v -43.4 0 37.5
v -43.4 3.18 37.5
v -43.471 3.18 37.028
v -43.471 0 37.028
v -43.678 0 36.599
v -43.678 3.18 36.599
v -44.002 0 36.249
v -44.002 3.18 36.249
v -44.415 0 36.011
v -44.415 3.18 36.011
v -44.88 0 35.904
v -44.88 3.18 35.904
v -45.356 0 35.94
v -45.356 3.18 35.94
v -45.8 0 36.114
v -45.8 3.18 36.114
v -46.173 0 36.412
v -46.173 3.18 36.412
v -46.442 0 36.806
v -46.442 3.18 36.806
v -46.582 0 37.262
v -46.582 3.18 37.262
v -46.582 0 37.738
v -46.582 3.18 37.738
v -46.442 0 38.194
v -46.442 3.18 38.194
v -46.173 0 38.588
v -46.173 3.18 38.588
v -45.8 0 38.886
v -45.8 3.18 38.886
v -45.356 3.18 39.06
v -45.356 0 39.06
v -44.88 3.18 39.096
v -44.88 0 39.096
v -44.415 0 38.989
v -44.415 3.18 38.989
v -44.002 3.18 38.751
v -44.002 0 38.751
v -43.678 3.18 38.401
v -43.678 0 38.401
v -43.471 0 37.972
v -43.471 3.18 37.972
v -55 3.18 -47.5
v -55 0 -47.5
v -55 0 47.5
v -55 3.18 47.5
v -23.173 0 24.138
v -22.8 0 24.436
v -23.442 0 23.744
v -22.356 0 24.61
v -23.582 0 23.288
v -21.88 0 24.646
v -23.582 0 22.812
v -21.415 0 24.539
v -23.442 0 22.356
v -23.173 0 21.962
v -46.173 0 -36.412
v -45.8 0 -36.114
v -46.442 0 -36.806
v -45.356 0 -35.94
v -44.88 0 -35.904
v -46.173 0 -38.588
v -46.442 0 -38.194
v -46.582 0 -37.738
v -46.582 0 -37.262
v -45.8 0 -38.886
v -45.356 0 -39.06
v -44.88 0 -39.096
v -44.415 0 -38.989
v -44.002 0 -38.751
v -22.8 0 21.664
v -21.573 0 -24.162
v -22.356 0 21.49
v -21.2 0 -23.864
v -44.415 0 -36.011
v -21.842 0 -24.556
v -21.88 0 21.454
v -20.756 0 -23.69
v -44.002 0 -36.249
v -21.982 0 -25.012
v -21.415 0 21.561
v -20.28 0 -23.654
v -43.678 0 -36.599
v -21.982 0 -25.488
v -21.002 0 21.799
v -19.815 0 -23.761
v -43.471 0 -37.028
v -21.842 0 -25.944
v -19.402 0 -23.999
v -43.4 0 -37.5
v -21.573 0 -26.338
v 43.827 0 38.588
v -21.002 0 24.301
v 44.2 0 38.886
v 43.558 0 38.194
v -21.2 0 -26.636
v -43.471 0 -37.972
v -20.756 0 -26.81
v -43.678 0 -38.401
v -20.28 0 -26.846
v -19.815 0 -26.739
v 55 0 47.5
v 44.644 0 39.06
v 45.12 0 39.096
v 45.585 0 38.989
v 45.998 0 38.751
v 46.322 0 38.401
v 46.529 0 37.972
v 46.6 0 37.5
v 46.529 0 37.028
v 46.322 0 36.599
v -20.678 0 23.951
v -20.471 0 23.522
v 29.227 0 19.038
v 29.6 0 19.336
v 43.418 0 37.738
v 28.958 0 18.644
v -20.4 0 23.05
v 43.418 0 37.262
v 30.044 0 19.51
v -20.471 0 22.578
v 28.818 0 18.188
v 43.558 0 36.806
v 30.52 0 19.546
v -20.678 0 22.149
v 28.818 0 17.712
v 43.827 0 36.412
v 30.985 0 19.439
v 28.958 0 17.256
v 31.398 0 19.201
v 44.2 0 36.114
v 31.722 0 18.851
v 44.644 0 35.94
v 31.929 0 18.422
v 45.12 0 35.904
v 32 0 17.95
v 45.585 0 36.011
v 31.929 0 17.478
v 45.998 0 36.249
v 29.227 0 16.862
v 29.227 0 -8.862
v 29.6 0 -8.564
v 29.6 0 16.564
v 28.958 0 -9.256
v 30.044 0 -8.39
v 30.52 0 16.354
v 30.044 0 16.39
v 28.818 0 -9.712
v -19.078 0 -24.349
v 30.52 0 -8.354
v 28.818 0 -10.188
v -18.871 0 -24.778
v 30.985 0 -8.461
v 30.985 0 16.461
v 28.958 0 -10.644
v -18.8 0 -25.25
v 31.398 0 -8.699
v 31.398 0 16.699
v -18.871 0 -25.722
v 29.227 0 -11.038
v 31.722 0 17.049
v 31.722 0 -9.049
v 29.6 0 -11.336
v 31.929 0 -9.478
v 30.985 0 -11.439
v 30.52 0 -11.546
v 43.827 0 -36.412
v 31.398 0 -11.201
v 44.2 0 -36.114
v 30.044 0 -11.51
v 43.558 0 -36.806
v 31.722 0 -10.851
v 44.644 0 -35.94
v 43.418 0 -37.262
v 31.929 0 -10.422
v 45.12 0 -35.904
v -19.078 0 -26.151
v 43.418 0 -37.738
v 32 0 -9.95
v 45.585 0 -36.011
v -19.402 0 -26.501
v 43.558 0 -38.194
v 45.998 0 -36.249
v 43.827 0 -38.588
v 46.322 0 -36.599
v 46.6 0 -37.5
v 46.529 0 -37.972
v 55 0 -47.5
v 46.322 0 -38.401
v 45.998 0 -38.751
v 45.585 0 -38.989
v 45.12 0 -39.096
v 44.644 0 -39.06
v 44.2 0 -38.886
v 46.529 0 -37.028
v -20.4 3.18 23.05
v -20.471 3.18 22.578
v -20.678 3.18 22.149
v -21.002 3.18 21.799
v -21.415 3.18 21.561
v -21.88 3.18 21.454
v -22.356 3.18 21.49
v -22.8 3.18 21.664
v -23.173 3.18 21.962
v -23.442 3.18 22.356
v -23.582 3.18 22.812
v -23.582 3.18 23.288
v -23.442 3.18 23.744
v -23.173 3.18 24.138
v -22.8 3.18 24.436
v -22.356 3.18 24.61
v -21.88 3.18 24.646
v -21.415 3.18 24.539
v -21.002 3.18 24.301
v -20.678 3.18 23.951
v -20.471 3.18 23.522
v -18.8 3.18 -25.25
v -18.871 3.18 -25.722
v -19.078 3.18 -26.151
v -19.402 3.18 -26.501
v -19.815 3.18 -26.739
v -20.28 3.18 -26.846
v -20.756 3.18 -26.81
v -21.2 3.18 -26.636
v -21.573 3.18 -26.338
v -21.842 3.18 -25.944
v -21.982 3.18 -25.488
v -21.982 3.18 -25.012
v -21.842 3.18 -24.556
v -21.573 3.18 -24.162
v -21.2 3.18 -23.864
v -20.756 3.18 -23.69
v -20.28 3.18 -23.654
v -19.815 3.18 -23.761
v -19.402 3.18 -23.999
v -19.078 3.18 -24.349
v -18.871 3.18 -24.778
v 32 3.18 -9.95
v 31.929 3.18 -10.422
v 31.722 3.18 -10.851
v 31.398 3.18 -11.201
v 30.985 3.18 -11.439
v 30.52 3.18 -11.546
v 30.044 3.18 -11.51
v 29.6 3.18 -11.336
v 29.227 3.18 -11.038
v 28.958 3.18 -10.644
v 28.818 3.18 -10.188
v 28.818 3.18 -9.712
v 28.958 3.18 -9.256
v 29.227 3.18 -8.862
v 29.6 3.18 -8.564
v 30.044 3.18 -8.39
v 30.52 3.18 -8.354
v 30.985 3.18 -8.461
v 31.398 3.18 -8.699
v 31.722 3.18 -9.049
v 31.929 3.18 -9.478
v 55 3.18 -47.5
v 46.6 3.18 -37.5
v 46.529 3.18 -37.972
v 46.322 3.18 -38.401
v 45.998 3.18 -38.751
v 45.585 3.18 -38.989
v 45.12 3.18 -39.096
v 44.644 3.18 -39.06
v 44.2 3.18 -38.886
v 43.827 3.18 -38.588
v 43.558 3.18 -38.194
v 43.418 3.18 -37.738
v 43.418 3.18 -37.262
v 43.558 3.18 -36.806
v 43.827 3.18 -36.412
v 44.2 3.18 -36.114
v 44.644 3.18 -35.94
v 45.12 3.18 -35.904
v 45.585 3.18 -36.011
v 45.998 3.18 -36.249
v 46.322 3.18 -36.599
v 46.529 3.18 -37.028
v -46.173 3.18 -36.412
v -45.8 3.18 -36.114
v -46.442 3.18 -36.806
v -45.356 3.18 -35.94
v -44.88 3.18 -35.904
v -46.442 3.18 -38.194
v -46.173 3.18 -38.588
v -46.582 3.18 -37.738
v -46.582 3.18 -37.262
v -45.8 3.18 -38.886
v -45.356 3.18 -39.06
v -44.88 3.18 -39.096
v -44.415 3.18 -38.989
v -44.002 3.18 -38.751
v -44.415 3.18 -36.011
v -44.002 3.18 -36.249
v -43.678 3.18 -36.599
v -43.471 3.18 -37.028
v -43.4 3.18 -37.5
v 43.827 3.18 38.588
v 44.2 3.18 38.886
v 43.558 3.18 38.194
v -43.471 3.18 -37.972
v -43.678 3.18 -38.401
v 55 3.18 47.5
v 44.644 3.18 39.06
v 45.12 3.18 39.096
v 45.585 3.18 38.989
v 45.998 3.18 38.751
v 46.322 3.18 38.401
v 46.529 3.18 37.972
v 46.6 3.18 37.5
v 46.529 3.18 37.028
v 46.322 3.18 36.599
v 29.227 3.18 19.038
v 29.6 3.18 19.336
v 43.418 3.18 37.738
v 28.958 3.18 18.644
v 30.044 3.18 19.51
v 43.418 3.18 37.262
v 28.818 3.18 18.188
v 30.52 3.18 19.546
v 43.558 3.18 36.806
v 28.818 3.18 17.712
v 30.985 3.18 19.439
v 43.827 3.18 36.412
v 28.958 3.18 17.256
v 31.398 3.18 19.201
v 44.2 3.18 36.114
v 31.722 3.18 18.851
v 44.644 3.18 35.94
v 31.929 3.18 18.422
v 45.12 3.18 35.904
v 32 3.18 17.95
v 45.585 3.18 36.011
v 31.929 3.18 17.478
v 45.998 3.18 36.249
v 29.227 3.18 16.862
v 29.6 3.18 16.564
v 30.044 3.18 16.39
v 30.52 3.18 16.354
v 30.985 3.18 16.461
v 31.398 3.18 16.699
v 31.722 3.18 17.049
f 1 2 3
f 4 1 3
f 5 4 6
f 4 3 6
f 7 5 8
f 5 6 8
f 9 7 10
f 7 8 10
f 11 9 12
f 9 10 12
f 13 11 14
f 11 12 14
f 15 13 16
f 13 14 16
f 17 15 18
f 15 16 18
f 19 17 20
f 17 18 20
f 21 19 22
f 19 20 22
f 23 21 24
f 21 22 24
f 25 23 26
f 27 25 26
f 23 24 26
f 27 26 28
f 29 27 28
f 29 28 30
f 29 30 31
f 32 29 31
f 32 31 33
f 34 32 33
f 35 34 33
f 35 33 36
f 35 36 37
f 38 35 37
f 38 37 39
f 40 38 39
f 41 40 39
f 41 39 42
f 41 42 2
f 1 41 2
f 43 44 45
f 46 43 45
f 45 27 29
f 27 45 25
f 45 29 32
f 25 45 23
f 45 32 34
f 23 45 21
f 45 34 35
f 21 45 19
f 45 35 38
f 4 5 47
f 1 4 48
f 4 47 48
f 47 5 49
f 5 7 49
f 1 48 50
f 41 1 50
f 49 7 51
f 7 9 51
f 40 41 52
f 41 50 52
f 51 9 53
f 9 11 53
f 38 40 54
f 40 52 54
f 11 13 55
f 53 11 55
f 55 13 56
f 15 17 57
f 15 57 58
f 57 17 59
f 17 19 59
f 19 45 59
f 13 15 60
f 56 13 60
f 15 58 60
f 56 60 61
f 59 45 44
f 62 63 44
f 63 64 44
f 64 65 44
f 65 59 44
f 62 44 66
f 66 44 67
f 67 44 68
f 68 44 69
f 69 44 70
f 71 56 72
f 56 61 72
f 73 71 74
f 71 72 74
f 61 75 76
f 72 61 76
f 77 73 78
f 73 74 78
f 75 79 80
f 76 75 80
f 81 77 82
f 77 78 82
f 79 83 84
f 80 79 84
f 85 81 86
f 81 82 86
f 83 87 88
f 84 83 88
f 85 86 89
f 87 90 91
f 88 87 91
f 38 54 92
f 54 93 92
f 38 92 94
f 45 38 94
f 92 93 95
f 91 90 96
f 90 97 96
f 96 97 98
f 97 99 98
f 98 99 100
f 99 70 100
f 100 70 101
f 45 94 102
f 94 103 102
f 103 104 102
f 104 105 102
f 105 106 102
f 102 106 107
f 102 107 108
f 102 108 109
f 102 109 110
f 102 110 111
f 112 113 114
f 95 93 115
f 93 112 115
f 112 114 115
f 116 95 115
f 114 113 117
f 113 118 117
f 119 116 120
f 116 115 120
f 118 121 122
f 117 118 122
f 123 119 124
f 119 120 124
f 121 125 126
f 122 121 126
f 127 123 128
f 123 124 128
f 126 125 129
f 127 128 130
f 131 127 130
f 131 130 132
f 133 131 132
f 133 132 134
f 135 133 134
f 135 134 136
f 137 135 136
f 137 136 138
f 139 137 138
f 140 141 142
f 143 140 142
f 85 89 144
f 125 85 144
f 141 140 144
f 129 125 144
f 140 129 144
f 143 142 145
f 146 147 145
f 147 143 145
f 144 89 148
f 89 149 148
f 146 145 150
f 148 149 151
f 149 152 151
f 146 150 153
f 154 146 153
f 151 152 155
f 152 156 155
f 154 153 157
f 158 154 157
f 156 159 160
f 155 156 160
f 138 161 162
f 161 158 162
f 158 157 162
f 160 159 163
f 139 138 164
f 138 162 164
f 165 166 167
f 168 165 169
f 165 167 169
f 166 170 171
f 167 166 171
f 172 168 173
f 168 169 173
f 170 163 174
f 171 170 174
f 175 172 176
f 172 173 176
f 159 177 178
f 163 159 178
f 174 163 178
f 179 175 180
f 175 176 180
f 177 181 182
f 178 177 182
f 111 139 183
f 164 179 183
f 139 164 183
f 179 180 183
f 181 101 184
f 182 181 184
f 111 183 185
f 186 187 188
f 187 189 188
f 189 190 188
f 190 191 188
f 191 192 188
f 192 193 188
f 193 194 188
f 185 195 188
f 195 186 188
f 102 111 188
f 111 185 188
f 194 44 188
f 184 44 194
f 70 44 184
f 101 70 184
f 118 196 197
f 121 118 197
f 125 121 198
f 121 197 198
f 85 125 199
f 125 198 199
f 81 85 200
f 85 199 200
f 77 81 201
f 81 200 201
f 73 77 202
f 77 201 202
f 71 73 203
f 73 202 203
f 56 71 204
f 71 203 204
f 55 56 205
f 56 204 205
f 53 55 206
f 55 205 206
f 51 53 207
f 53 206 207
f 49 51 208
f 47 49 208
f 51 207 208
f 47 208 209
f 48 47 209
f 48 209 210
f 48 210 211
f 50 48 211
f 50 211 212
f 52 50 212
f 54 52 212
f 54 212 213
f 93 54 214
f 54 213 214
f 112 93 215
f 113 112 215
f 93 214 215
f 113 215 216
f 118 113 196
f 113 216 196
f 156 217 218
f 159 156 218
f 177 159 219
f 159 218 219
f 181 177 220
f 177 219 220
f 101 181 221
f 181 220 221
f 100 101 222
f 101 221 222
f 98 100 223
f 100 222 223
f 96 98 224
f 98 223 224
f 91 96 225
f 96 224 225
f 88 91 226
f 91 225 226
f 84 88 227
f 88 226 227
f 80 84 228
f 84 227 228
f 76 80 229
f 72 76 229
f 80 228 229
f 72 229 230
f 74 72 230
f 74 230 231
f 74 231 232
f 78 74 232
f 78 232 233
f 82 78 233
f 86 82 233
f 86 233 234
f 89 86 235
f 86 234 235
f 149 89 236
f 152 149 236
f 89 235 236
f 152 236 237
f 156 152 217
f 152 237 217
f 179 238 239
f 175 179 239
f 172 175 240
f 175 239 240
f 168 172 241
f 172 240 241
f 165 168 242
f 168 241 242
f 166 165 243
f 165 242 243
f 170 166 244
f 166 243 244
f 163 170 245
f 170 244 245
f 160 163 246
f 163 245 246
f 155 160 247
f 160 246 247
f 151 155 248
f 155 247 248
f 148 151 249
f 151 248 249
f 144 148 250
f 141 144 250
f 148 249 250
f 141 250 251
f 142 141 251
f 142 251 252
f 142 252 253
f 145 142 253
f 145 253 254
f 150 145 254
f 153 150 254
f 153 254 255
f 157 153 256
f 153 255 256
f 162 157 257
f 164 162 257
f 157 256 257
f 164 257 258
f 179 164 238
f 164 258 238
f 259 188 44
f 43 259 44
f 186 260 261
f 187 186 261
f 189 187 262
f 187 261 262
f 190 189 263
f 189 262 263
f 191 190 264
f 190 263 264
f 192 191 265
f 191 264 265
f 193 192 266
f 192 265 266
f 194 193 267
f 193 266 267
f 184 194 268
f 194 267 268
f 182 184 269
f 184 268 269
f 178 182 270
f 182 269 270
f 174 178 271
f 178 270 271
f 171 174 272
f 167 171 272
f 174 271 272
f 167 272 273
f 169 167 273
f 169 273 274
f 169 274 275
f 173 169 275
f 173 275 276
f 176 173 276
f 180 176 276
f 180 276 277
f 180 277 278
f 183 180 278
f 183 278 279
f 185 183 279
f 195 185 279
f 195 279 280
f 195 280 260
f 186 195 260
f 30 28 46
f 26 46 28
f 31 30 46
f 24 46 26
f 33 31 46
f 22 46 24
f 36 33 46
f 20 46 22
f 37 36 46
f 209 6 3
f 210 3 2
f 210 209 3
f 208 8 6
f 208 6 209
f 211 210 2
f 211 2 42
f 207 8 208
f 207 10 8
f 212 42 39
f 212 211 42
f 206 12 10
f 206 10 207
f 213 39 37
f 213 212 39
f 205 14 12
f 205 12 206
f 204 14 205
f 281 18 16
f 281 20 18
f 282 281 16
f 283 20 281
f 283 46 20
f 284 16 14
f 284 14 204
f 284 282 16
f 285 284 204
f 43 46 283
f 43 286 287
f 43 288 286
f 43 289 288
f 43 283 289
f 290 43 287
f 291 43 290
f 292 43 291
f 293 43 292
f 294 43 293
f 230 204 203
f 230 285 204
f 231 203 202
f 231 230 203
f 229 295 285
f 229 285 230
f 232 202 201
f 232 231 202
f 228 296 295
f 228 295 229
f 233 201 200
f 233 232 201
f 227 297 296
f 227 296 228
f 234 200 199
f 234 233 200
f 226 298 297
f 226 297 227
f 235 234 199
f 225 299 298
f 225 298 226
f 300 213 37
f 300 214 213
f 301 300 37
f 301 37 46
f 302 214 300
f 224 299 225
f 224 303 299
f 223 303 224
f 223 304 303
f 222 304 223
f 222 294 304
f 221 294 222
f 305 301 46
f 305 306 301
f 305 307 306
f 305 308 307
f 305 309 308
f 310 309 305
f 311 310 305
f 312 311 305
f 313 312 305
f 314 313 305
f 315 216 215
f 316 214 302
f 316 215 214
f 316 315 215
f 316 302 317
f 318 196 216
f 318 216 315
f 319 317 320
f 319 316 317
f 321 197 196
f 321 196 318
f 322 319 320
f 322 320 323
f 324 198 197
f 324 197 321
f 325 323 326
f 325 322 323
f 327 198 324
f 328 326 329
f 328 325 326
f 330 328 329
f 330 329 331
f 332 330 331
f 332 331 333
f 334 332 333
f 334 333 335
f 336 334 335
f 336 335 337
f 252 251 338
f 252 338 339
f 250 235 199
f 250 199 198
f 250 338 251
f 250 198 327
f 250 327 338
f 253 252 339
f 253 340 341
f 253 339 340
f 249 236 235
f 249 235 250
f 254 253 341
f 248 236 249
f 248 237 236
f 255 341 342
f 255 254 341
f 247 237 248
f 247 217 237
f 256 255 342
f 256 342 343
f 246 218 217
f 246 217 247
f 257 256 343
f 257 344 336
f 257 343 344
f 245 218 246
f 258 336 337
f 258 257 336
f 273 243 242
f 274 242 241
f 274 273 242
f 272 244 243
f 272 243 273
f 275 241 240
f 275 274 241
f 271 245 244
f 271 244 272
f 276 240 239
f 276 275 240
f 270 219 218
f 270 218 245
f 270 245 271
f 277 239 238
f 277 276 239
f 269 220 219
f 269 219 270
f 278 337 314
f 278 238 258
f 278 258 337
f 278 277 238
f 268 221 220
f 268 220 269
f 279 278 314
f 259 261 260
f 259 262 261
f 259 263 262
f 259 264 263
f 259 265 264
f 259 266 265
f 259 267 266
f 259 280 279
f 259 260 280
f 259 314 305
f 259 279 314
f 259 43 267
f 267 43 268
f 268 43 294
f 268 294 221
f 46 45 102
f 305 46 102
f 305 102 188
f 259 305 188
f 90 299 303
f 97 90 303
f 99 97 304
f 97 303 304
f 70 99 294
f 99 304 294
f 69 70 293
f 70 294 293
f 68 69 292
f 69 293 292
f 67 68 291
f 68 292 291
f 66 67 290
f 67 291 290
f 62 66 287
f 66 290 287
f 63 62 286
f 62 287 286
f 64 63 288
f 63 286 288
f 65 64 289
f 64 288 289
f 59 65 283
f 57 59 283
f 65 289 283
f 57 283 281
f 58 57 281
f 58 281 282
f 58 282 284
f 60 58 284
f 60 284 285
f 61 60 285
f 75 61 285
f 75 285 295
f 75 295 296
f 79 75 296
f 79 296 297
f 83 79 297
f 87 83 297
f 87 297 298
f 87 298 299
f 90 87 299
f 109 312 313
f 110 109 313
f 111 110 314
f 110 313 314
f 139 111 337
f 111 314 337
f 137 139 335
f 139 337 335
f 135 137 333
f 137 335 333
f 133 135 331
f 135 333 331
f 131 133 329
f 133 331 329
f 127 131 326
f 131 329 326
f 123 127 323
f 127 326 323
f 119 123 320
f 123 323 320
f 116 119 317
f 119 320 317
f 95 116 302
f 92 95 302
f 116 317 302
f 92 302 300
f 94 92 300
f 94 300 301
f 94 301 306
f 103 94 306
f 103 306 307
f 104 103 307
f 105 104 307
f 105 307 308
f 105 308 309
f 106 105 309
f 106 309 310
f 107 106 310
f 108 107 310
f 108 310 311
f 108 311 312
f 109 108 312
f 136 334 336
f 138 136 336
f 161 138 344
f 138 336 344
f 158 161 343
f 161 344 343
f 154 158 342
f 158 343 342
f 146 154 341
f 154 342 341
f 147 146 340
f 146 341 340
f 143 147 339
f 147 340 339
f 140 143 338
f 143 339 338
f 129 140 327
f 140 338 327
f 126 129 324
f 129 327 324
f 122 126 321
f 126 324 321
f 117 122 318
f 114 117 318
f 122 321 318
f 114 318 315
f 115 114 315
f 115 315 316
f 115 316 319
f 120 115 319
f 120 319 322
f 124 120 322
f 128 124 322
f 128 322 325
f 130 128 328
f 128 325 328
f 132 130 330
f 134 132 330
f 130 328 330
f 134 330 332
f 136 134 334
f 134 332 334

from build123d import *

# Parameters (mm, degrees)
BOSS_EXTRUDE1_DEPTH = 3.18
SKETCH2_R           = 1.6
CUT_EXTRUDE1_DEPTH  = 3.18
SKETCH3_R           = 1.6
CUT_EXTRUDE2_DEPTH  = 10


with BuildPart() as part:
    # Sketch1 → Boss-Extrude1 (new body)
    with BuildSketch(Plane(origin=(0, 0, 0), x_dir=(1, 0, 0), z_dir=(0, 1, 0))):
        Polygon((0, 0), (-55, 47.5), (-55, -47.5), align=None)
        Polygon((55, -47.5), (0, 0), (-55, -47.5), align=None)
        Polygon((55, 47.5), (0, 0), (55, -47.5), align=None)
        Polygon((55, 47.5), (-55, 47.5), (0, 0), align=None)
    extrude(amount=BOSS_EXTRUDE1_DEPTH)

    # Sketch2 → Cut-Extrude1 (cut)
    with BuildSketch(Plane(origin=(0, 3.18, 0), x_dir=(1, 0, 0), z_dir=(0, 1, 0))):
        with Locations((-20.4, 25.25)):
            Circle(SKETCH2_R)
        with Locations((-22, -23.05)):
            Circle(SKETCH2_R)
        with Locations((30.4, 9.95)):
            Circle(SKETCH2_R)
        with Locations((30.4, -17.95)):
            Circle(SKETCH2_R)
    extrude(amount=-CUT_EXTRUDE1_DEPTH, mode=Mode.SUBTRACT)

    # Sketch3 → Cut-Extrude2 (cut)
    with BuildSketch(Plane(origin=(0, 3.18, 0), x_dir=(1, 0, 0), z_dir=(0, 1, 0))):
        with Locations((45, 37.5)):
            Circle(SKETCH3_R)
        with Locations((45, -37.5)):
            Circle(SKETCH3_R)
        with Locations((-45, 37.5)):
            Circle(SKETCH3_R)
        with Locations((-45, -37.5)):
            Circle(SKETCH3_R)
    extrude(amount=-CUT_EXTRUDE2_DEPTH, mode=Mode.SUBTRACT)


solid = part.part
